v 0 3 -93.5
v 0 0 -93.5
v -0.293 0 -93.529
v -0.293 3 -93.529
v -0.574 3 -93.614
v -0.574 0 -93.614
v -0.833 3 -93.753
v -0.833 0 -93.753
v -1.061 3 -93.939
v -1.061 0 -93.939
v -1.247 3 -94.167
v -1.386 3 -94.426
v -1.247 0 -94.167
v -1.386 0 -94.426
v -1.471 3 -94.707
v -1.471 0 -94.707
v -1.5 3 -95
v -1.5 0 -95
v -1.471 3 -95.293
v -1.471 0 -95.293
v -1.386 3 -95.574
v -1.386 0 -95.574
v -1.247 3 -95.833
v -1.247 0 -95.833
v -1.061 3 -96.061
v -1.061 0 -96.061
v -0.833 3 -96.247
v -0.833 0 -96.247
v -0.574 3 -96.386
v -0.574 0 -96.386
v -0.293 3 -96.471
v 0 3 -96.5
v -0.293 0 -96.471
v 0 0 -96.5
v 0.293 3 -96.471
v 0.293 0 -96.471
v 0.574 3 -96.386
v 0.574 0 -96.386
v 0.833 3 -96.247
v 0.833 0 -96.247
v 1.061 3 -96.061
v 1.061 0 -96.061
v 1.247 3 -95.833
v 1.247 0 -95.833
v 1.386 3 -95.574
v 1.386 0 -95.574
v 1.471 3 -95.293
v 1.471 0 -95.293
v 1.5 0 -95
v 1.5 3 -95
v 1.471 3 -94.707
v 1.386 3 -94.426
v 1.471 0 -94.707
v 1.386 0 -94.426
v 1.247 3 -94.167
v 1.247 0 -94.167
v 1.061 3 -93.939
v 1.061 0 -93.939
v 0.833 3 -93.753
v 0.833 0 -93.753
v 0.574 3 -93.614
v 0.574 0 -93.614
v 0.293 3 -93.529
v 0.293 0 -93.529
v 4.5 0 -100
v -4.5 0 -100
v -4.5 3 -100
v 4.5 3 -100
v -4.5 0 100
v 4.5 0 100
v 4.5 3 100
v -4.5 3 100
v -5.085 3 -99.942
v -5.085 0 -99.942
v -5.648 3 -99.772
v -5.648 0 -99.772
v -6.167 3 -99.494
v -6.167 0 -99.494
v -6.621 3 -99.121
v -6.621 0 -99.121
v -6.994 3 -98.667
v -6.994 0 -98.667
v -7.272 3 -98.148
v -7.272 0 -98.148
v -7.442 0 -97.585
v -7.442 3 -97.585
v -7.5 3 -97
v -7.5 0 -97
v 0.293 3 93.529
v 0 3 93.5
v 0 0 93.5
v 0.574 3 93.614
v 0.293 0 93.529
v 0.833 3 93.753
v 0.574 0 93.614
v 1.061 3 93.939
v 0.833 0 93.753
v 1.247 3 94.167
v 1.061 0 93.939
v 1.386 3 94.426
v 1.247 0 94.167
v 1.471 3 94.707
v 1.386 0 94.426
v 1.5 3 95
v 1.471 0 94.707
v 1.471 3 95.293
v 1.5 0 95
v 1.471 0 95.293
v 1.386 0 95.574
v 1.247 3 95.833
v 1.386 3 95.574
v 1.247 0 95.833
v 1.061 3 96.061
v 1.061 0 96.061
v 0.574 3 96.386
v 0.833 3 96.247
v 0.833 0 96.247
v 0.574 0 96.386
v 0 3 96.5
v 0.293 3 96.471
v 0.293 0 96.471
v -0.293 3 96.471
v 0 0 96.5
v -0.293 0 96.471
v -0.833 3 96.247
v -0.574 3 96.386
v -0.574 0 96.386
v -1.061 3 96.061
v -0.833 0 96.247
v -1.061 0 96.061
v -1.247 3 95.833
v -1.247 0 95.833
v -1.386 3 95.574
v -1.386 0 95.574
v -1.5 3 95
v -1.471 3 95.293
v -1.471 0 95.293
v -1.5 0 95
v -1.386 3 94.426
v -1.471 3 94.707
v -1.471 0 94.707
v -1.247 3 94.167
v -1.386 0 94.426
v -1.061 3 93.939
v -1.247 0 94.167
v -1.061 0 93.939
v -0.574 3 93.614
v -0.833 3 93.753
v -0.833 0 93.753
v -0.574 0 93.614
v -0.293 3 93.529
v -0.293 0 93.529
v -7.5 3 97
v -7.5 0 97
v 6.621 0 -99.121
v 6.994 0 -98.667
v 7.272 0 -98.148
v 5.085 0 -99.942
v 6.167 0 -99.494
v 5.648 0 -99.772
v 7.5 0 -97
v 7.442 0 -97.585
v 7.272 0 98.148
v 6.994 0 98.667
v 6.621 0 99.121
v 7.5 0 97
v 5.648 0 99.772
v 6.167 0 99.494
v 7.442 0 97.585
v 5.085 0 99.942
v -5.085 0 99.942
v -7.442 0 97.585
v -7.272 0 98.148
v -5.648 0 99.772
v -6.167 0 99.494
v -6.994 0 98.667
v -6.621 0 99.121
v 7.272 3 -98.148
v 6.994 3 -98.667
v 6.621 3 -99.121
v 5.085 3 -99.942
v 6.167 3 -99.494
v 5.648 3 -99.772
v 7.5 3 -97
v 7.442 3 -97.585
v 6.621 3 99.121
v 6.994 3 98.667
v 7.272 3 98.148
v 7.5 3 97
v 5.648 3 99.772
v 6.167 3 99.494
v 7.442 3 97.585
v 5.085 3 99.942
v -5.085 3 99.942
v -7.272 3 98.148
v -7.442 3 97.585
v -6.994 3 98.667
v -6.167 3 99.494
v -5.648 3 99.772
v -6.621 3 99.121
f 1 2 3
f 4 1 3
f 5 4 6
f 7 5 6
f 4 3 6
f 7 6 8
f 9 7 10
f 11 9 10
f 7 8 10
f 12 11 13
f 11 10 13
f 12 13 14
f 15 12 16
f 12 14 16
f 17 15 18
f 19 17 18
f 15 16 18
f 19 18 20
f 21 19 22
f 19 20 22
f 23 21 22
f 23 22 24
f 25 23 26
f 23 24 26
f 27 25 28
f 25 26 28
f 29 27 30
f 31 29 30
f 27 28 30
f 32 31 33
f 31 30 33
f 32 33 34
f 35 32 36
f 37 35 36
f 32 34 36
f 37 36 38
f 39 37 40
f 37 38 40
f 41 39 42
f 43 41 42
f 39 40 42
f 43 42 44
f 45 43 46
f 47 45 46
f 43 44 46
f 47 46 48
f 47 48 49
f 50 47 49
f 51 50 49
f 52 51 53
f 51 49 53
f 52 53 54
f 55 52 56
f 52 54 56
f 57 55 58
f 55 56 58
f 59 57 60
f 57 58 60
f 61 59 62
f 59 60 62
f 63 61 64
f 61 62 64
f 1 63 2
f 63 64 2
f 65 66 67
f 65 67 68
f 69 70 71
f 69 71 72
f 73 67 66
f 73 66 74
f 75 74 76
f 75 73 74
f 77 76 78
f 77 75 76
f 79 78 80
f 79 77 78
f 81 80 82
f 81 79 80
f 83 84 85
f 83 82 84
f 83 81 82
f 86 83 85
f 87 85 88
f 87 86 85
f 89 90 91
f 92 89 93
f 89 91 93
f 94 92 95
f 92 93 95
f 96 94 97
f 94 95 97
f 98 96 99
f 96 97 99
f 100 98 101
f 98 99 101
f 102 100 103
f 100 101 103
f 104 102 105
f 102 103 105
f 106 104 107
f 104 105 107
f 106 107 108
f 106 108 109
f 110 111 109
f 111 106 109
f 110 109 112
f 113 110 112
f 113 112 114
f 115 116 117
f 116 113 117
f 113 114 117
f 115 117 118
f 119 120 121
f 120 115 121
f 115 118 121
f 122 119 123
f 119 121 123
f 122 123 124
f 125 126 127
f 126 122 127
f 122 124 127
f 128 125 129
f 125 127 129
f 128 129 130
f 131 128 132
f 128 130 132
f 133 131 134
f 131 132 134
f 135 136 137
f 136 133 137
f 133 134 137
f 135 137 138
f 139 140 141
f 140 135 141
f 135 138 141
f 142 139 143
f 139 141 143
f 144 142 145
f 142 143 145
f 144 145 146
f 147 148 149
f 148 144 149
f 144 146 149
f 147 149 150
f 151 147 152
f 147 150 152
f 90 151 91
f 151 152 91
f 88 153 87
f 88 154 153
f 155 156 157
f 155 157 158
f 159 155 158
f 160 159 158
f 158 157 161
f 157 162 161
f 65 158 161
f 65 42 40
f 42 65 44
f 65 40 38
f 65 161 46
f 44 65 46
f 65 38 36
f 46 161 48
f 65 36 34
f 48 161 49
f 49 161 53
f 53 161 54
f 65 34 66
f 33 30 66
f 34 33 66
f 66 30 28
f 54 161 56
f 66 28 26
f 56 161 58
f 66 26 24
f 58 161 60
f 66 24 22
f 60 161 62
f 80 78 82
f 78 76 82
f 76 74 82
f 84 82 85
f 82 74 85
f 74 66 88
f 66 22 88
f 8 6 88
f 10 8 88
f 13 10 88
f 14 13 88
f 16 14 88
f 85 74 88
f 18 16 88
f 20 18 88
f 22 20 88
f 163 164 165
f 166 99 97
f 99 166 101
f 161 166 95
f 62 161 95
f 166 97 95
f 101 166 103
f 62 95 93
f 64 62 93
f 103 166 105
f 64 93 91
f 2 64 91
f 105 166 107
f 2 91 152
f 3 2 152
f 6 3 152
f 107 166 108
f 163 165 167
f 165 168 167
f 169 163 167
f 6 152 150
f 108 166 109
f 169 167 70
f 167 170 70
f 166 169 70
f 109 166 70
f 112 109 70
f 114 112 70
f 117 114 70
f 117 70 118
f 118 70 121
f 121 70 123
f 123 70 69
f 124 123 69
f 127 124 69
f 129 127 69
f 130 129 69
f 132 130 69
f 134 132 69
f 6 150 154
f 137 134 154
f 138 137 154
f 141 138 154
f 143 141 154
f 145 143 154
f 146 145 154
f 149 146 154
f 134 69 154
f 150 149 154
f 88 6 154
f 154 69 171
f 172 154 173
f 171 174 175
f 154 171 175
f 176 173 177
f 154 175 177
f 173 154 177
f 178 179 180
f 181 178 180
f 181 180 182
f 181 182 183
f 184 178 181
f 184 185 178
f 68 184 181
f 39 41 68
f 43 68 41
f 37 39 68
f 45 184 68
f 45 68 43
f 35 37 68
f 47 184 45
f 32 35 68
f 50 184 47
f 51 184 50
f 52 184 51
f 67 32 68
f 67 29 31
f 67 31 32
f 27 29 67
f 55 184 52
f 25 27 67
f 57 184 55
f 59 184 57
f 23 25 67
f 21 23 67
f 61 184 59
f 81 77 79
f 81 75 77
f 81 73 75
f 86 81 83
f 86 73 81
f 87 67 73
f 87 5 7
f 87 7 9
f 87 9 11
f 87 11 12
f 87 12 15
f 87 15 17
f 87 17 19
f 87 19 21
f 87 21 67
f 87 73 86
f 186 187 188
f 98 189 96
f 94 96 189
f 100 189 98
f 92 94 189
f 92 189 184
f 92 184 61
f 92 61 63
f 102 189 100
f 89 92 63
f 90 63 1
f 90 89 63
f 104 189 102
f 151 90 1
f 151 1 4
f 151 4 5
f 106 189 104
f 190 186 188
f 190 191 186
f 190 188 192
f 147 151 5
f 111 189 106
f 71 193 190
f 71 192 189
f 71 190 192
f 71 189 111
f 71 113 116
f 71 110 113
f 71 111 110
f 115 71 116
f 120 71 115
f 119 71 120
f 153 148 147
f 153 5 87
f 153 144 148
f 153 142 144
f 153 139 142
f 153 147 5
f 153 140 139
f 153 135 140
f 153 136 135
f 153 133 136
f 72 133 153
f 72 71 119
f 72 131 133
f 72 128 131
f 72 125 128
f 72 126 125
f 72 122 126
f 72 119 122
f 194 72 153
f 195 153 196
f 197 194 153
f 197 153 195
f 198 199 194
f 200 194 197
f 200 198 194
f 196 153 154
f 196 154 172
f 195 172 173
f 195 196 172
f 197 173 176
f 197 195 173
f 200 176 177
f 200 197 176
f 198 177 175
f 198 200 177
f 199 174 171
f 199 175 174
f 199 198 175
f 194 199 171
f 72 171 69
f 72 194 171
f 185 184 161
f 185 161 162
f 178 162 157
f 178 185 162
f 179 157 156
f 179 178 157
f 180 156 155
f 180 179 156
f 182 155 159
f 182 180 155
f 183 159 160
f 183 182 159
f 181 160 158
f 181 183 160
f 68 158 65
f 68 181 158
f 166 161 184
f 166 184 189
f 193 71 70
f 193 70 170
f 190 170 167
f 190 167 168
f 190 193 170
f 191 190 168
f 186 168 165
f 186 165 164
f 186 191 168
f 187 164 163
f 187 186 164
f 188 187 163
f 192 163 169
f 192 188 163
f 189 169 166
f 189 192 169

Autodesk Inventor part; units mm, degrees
ref_plane "YZ Plane" through (0, 0, 0) normal (1, 0, 0) x (0, 1, 0)
ref_plane "XZ Plane" through (0, 0, 0) normal (0, 1, 0) x (-1, 0, 0)
ref_plane "XY Plane" through (0, 0, 0) normal (0, 0, 1) x (1, 0, 0)
sketch "Sketch1" plane through (0, 0, 0) normal (0, 1, 0) x (-1, 0, 0)
  line L0 (-7.5, 100) -> (7.5, 100)
  line L1 (7.5, 100) -> (7.5, -100)
  line L2 (7.5, -100) -> (-7.5, -100)
  line L3 (-7.5, -100) -> (-7.5, 100)
  line L4 (-7.5, 100) -> (7.5, -100) construction
  line L5 (7.5, 100) -> (-7.5, -100) construction
  point P0 (0, 0)
  dimension "d0" = 15
  dimension "d1" = 200
extrude "Extrusion1" add sketch "Sketch1" along normal blind 3
sketch "Sketch2" plane through (0, 3, 0) normal (0, 1, 0) x (1, 0, 0)
  line L0 (7.5, 100) -> (-7.5, 100) construction
  line L1 (0, 100) -> (0, 95) construction
  point P0 (0, 0)
  dimension "d4" = 5
hole "Hole1" at (0, 3, -95) direction (0, -1, 0) diameter 3 end through all
ref_plane "Work Plane1" through (-7.5, 0, 0) normal (0, 0, 1) x (1, 0, 0)
mirror "Mirror1" about plane through (-7.5, 0, 0) normal (0, 0, 1) of "Hole1"
fillet "Fillet1" radius 3 4 edges at (7.5, 1.5, -100) (-7.5, 1.5, -100) (7.5, 1.5, 100) (-7.5, 1.5, 100)
properties part number "pin"
